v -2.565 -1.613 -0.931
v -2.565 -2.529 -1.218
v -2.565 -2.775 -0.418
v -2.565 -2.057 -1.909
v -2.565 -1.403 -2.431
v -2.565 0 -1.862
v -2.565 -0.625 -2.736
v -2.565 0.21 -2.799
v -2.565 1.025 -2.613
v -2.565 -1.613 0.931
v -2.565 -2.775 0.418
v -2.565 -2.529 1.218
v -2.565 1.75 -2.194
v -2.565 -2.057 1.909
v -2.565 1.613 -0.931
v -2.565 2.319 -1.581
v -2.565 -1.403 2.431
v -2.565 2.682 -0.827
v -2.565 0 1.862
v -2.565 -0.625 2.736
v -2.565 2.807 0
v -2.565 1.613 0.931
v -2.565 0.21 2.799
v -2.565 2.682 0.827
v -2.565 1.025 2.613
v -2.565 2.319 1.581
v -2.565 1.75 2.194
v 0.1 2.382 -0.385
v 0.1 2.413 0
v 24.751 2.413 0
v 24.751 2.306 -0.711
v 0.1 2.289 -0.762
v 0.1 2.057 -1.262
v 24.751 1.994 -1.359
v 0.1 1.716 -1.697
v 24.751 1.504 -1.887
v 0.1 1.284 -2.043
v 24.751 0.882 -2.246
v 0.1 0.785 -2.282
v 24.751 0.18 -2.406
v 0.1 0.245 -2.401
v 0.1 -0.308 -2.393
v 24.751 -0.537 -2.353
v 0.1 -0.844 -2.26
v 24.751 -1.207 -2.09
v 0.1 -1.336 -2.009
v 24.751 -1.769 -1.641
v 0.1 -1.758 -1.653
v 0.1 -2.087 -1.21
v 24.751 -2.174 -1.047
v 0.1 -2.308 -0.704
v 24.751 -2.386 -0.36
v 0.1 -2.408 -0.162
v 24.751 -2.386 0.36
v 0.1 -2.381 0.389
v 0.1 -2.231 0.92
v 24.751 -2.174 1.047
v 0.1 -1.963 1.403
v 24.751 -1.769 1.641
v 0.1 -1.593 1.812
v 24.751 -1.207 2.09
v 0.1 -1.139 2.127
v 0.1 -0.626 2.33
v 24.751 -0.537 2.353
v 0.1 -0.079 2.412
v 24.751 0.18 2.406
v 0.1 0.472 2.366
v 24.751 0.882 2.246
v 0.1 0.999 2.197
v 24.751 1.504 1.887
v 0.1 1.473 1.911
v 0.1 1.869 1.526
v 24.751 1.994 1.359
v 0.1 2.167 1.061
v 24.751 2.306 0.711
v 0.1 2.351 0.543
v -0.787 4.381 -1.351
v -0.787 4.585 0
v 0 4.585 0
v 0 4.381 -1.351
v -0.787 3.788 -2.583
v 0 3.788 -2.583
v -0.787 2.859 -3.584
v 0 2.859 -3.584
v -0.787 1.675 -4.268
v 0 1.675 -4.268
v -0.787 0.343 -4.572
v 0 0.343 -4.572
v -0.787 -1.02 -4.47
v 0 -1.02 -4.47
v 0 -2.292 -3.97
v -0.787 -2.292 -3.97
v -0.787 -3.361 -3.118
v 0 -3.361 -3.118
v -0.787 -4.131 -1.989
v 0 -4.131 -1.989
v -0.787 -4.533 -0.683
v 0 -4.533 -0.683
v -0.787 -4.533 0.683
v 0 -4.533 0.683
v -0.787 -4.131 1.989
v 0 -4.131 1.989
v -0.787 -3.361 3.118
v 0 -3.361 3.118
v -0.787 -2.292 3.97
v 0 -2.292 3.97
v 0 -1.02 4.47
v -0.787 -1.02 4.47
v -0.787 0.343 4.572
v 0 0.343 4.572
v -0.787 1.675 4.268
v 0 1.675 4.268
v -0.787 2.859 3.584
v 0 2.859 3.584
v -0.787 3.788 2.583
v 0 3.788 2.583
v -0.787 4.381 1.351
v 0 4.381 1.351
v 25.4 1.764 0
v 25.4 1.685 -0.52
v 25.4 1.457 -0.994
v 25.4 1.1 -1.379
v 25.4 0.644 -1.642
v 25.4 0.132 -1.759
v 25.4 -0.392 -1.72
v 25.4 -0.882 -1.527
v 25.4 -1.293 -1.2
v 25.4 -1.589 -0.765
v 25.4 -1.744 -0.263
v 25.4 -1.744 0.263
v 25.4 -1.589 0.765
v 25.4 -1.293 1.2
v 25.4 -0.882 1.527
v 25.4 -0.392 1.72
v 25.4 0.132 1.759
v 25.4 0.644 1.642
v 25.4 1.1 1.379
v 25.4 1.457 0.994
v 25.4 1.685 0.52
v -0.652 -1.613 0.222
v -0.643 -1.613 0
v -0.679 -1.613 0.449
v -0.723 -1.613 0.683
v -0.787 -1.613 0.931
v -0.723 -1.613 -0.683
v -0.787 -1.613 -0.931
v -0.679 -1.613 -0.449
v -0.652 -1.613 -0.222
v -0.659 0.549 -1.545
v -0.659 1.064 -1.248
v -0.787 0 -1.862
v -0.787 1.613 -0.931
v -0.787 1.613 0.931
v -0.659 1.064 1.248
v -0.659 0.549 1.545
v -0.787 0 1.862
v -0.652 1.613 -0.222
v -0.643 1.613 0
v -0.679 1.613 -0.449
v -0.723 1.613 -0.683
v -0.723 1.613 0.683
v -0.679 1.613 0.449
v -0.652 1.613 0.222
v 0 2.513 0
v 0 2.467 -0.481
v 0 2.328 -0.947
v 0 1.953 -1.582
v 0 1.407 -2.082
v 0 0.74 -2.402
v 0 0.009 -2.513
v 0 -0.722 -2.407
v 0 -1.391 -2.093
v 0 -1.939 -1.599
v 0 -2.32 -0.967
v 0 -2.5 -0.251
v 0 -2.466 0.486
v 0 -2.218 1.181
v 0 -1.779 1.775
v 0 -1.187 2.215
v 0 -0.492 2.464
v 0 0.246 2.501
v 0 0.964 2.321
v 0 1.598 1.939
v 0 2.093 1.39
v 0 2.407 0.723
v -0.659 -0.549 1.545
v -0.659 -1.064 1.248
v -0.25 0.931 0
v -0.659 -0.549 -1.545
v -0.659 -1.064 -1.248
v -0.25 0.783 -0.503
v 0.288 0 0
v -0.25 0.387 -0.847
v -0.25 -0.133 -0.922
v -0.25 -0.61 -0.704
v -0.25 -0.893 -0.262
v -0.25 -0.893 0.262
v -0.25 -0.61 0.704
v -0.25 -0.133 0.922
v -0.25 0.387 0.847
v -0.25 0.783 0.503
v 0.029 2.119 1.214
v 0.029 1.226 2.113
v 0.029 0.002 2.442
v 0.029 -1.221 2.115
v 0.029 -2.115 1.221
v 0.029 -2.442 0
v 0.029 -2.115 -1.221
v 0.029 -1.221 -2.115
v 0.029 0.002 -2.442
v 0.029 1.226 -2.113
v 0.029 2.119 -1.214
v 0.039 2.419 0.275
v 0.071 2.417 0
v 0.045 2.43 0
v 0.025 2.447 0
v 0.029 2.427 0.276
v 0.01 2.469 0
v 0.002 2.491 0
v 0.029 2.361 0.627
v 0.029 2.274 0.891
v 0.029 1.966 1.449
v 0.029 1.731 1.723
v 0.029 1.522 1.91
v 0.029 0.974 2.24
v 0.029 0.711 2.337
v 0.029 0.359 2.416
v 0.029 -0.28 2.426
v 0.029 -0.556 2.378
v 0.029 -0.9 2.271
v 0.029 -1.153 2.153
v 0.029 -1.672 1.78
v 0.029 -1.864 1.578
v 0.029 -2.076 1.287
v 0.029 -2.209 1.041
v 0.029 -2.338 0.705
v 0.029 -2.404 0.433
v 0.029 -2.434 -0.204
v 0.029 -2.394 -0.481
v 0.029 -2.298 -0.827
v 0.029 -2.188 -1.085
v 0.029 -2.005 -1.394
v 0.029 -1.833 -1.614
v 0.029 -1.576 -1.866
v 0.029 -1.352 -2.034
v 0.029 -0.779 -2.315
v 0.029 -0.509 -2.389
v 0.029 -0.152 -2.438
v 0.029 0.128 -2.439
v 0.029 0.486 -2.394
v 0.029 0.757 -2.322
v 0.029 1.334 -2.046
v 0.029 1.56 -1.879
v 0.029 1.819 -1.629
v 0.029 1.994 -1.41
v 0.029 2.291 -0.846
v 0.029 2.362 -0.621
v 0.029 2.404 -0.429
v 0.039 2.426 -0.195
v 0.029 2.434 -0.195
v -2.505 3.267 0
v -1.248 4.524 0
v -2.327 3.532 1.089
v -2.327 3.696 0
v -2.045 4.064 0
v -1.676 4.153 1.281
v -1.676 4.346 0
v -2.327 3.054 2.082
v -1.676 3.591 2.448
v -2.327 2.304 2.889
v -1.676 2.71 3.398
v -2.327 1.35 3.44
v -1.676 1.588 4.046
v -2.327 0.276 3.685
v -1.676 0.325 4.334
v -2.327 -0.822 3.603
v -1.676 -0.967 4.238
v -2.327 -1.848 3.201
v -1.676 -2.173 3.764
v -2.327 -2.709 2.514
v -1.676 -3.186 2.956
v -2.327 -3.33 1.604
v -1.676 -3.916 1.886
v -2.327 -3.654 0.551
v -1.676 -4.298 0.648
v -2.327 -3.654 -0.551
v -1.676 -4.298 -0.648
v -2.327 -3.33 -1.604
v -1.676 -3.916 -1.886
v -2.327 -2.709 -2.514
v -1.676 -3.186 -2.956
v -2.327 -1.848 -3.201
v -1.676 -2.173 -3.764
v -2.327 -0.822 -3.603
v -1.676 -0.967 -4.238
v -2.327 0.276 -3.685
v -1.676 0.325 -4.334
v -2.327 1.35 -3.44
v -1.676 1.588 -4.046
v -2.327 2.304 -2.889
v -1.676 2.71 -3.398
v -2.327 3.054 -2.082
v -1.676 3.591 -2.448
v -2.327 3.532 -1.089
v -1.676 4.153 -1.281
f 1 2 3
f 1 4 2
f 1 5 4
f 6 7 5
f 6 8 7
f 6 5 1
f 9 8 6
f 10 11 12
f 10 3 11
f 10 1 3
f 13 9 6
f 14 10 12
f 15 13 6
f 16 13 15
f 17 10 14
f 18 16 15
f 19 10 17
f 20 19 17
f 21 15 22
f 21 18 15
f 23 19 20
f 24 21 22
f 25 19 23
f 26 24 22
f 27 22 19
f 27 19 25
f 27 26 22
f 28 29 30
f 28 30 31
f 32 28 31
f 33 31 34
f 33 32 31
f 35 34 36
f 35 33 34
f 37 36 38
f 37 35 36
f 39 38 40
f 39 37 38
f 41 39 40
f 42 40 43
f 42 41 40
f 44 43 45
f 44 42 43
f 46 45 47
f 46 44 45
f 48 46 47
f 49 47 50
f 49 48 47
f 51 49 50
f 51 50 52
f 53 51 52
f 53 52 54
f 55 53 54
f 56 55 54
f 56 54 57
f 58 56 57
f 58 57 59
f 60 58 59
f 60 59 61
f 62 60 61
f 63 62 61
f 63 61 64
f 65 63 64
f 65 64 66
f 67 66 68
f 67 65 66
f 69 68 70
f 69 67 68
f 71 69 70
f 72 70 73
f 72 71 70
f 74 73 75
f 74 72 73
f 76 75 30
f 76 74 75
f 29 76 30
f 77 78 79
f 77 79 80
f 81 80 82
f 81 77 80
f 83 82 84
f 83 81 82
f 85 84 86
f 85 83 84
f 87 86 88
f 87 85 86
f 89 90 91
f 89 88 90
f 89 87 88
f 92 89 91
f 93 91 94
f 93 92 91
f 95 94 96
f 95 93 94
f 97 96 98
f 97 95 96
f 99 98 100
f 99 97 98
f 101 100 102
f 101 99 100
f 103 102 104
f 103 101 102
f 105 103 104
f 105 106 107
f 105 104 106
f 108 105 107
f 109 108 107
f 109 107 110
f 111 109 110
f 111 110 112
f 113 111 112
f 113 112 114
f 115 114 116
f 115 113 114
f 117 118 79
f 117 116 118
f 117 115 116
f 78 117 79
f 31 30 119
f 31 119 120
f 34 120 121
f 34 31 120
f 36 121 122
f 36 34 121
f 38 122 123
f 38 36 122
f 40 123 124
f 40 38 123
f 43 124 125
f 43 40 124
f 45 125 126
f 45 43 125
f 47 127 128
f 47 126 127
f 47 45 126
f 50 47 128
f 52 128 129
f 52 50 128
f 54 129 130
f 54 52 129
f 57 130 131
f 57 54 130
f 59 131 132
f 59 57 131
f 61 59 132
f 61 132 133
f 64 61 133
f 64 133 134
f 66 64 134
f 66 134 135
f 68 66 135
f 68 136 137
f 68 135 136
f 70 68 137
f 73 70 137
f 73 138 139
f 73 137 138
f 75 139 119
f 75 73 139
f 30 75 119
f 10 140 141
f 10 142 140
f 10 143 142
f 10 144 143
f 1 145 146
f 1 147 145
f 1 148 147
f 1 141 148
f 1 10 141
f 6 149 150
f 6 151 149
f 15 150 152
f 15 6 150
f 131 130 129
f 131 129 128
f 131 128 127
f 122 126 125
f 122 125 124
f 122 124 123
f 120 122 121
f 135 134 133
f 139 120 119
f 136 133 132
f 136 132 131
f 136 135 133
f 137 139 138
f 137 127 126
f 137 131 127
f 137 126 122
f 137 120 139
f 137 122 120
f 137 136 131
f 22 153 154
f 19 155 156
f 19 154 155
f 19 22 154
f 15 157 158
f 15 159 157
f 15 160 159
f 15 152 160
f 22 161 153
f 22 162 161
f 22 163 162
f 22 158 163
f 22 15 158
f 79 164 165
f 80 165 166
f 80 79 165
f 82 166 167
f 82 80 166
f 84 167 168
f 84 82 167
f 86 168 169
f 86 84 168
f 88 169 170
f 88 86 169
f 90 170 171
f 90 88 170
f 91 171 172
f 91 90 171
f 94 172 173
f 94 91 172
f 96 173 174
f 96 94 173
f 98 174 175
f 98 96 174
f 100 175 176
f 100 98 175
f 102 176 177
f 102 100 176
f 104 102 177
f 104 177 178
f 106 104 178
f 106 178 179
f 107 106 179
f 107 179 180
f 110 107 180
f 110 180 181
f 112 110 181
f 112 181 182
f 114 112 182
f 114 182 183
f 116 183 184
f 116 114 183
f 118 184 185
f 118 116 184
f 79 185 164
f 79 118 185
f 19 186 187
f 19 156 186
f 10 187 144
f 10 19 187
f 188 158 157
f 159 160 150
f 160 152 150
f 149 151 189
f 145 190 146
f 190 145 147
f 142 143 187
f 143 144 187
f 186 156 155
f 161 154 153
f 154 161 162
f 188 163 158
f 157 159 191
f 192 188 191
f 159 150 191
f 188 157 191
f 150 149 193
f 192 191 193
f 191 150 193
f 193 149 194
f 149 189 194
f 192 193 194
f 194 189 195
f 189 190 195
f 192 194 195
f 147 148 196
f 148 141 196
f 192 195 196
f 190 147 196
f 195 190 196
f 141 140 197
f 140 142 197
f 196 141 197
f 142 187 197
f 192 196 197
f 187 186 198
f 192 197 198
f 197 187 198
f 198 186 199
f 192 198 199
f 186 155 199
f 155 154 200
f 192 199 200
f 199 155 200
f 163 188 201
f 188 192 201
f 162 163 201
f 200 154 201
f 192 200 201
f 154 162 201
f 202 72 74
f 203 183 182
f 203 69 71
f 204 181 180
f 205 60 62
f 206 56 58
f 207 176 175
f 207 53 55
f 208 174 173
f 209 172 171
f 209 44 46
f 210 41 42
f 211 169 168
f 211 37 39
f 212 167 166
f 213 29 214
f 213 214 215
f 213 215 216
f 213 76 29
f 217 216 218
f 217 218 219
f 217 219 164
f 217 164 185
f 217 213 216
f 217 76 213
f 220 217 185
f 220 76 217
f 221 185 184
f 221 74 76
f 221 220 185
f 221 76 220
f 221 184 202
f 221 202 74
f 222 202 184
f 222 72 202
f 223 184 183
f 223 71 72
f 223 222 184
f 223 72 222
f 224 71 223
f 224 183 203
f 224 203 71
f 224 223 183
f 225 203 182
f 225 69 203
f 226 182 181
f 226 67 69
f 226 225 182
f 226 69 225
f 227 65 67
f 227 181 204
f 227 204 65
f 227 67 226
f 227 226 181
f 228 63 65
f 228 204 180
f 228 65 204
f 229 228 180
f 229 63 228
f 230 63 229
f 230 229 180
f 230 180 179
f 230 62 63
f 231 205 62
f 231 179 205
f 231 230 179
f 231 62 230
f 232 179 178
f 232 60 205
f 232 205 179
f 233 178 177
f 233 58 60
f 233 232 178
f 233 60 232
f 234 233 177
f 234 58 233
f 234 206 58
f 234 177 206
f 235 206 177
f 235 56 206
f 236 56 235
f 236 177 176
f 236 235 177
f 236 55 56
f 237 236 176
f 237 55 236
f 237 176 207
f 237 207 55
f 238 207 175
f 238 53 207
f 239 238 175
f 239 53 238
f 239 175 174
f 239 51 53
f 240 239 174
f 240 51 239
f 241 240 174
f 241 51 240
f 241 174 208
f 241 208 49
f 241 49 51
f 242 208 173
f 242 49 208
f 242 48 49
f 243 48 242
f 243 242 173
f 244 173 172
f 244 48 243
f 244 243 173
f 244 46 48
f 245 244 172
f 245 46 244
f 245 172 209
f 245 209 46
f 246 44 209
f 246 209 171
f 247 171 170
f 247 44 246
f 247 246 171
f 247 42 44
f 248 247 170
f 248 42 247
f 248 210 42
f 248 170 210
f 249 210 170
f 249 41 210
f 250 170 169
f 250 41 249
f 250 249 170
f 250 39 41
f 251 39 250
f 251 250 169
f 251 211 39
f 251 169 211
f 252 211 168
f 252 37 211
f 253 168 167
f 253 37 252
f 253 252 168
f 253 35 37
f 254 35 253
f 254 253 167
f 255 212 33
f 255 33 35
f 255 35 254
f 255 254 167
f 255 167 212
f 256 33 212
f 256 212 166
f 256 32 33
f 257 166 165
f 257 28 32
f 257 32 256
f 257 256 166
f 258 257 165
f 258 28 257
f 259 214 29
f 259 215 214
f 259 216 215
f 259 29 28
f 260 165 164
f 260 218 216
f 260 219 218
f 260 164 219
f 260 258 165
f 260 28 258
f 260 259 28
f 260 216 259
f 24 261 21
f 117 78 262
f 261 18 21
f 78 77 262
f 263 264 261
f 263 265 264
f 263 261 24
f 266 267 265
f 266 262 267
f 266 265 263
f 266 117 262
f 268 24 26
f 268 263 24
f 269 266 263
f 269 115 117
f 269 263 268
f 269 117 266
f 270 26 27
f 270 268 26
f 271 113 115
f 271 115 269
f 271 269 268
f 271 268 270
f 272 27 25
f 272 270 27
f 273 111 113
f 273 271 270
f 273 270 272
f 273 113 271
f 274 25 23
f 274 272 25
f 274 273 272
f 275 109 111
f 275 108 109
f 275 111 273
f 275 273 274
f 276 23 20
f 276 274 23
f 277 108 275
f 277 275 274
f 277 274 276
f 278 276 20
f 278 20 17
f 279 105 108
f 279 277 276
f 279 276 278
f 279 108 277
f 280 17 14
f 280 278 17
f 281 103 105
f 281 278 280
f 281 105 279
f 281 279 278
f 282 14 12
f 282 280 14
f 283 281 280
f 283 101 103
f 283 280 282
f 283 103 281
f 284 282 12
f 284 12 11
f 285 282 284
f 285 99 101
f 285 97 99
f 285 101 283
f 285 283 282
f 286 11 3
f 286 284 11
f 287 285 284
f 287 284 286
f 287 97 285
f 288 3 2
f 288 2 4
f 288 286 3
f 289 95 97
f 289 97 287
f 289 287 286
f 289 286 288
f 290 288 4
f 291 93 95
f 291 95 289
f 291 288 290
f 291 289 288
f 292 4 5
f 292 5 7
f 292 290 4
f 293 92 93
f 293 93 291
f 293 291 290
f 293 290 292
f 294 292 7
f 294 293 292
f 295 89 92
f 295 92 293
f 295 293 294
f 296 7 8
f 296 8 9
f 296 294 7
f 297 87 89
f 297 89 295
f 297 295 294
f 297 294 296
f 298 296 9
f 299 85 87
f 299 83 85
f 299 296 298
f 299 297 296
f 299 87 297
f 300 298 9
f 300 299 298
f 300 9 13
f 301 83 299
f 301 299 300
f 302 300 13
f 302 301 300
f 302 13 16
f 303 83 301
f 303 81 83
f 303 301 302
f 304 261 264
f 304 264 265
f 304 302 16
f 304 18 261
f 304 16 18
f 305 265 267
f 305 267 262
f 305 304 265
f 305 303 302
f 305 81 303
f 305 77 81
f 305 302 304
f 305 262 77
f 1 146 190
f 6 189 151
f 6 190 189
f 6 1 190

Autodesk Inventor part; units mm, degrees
ref_plane "YZ Plane" through (0, 0, 0) normal (1, 0, 0) x (0, 1, 0)
ref_plane "XZ Plane" through (0, 0, 0) normal (0, 1, 0) x (-1, 0, 0)
sketch "Sketch1" plane through (0, 0, 0) normal (0, 0, 1) x (1, 0, 0)
  line L0 (0.2879, 0) -> (25.4, 0)
  line L1 (25.4, 0) -> (25.4, 2.413)
  line L2 (25.4, 2.413) -> (2.0322, 2.413)
  line L3 (2.0322, 2.413) -> (0.0001, 2.413)
  line L4 (0.0001, 2.413) -> (0, 2.413)
  line L5 (0, 2.413) -> (0, 4.5847)
  line L6 (0, 4.5847) -> (-2.5654, 4.5847)
  line L7 (-2.5654, 4.5847) -> (-2.5654, 1.8624)
  line L8 (-2.5654, 1.8624) -> (-0.7874, 1.8624)
  line L9 (-0.7874, 1.8624) -> (0.2879, 0)
  line L10 (-8.1585, 0) -> (30.9931, 0) projected
  line L11 (0, -0.9169) -> (0, 5.5016) projected
  line L12 (2.0322, 2.413) -> (0, 2.413) construction
  dimension "d1" = 23.3678
  dimension "d2" = 2.0321
  dimension "d3" = 2.5654
  dimension "d4" = 1.778
  dimension "d5" = 60
  dimension "d6" = 4.826
  dimension "d7" = 4.826
  dimension "d8" = 3.7248
  dimension "d9" = 9.1694
  dimension "d26" = 25.4
revolve "Body" add sketch "Sketch1" angle 360 about axis through (0.2879, 0, 0) along (1, 0, 0) contours L9 L11 L3 L2 L1 L0 | L9 L8 L7 L6 L5 L11
sketch "Sketch2" plane through (-2.5654, 0, 0) normal (-1, 0, 0) x (0, 0, 1)
  circle A0 centre (0, 0) radius 1.8624 projected
  line L0 (0, -6.4186) -> (0, 6.4186) projected
  line L1 (-6.4186, 0) -> (6.4186, 0) projected
  line L2 (1.8624, 0) -> (0.9312, -1.6129)
  line L3 (0.9312, -1.6129) -> (-0.9312, -1.6129)
  line L4 (-0.9312, -1.6129) -> (-1.8624, 0)
  line L5 (-1.8624, 0) -> (-0.9312, 1.6129)
  line L6 (-0.9312, 1.6129) -> (0.9312, 1.6129)
  line L7 (0.9312, 1.6129) -> (1.8624, 0)
extrude "Slot" add sketch "Sketch2" against normal up to next contours L7 A0 | A0 L2 | L6 L0 A0 | A0 L0 L3 | L0 L6 A0 | A0 L3 L0 | L4 A0 | A0 L5
fillet "Fillet1" radius 1.778 1 edges at (-2.5654, -4.5847, 0)
thread "Thread" size "10-24 UNC" class "2A" standard "ANSI Unified Screw Threads" length 23.3678
chamfer "Chamfer1" distance 0.6492 distance2 0.6492 1 edges at (25.4, -2.413, 0) measured on face at (25.4, 0.9527, 0.2826)
ref_plane "Work Plane1" through (29, 0, 0) normal (0, -1, 0) x (1, 0, 0)
fillet "Fillet2" radius 0.1 1 edges at (0.0001, -2.413, 0)
equation "\"d30\" = R"
equation "\"d17\" = RR"
equation "\"d13\" = GEL"
equation "\"d15\" = -0.5 * SPD + 0.5 * GD"
equation "\"d16\" = GUL"
equation "\"d1\" = GEL"
equation "\"d3\" = KOH"
equation "\"d4\" = INTI"
equation "\"d6\" = GD"
equation "\"d7\" = BDM"
equation "\"d8\" = 1.1547 * SW"
equation "\"d9\" = KOD"
equation "\"d26\" = NLG"
equation "\"GD\" = NND"
equation "\"NLG\" = 25.4"
equation "\"GEL\" = 23.3678"
equation "\"KOD\" = 9.1694"
equation "\"KOH\" = 2.5654"
equation "\"INTI\" = 1.778"
equation "\"GAL\" = 2.032"
equation "\"GUL\" = 0.64922"
equation "\"BDM\" = NND"
equation "\"SW\" = 3.2258"
equation "\"RR\" = 1.778"
equation "\"SPD\" = GD1"
equation "\"R\" = 0.1"
equation "\"KR\" = 5.4102"
equation "\"GD1\" = 3.52755"
equation "\"THREADDIA\" = 4.826"
equation "\"FAWI\" = 45deg"
equation "\"KOH1\" = 1.778"
equation "\"NND\" = 4.826"
equation "\"TOA\" = 30deg"
equation "\"E0\" = 1.155 * SW"
properties part number "Unbrako - 10 x 1" material "Steel, Mild"
